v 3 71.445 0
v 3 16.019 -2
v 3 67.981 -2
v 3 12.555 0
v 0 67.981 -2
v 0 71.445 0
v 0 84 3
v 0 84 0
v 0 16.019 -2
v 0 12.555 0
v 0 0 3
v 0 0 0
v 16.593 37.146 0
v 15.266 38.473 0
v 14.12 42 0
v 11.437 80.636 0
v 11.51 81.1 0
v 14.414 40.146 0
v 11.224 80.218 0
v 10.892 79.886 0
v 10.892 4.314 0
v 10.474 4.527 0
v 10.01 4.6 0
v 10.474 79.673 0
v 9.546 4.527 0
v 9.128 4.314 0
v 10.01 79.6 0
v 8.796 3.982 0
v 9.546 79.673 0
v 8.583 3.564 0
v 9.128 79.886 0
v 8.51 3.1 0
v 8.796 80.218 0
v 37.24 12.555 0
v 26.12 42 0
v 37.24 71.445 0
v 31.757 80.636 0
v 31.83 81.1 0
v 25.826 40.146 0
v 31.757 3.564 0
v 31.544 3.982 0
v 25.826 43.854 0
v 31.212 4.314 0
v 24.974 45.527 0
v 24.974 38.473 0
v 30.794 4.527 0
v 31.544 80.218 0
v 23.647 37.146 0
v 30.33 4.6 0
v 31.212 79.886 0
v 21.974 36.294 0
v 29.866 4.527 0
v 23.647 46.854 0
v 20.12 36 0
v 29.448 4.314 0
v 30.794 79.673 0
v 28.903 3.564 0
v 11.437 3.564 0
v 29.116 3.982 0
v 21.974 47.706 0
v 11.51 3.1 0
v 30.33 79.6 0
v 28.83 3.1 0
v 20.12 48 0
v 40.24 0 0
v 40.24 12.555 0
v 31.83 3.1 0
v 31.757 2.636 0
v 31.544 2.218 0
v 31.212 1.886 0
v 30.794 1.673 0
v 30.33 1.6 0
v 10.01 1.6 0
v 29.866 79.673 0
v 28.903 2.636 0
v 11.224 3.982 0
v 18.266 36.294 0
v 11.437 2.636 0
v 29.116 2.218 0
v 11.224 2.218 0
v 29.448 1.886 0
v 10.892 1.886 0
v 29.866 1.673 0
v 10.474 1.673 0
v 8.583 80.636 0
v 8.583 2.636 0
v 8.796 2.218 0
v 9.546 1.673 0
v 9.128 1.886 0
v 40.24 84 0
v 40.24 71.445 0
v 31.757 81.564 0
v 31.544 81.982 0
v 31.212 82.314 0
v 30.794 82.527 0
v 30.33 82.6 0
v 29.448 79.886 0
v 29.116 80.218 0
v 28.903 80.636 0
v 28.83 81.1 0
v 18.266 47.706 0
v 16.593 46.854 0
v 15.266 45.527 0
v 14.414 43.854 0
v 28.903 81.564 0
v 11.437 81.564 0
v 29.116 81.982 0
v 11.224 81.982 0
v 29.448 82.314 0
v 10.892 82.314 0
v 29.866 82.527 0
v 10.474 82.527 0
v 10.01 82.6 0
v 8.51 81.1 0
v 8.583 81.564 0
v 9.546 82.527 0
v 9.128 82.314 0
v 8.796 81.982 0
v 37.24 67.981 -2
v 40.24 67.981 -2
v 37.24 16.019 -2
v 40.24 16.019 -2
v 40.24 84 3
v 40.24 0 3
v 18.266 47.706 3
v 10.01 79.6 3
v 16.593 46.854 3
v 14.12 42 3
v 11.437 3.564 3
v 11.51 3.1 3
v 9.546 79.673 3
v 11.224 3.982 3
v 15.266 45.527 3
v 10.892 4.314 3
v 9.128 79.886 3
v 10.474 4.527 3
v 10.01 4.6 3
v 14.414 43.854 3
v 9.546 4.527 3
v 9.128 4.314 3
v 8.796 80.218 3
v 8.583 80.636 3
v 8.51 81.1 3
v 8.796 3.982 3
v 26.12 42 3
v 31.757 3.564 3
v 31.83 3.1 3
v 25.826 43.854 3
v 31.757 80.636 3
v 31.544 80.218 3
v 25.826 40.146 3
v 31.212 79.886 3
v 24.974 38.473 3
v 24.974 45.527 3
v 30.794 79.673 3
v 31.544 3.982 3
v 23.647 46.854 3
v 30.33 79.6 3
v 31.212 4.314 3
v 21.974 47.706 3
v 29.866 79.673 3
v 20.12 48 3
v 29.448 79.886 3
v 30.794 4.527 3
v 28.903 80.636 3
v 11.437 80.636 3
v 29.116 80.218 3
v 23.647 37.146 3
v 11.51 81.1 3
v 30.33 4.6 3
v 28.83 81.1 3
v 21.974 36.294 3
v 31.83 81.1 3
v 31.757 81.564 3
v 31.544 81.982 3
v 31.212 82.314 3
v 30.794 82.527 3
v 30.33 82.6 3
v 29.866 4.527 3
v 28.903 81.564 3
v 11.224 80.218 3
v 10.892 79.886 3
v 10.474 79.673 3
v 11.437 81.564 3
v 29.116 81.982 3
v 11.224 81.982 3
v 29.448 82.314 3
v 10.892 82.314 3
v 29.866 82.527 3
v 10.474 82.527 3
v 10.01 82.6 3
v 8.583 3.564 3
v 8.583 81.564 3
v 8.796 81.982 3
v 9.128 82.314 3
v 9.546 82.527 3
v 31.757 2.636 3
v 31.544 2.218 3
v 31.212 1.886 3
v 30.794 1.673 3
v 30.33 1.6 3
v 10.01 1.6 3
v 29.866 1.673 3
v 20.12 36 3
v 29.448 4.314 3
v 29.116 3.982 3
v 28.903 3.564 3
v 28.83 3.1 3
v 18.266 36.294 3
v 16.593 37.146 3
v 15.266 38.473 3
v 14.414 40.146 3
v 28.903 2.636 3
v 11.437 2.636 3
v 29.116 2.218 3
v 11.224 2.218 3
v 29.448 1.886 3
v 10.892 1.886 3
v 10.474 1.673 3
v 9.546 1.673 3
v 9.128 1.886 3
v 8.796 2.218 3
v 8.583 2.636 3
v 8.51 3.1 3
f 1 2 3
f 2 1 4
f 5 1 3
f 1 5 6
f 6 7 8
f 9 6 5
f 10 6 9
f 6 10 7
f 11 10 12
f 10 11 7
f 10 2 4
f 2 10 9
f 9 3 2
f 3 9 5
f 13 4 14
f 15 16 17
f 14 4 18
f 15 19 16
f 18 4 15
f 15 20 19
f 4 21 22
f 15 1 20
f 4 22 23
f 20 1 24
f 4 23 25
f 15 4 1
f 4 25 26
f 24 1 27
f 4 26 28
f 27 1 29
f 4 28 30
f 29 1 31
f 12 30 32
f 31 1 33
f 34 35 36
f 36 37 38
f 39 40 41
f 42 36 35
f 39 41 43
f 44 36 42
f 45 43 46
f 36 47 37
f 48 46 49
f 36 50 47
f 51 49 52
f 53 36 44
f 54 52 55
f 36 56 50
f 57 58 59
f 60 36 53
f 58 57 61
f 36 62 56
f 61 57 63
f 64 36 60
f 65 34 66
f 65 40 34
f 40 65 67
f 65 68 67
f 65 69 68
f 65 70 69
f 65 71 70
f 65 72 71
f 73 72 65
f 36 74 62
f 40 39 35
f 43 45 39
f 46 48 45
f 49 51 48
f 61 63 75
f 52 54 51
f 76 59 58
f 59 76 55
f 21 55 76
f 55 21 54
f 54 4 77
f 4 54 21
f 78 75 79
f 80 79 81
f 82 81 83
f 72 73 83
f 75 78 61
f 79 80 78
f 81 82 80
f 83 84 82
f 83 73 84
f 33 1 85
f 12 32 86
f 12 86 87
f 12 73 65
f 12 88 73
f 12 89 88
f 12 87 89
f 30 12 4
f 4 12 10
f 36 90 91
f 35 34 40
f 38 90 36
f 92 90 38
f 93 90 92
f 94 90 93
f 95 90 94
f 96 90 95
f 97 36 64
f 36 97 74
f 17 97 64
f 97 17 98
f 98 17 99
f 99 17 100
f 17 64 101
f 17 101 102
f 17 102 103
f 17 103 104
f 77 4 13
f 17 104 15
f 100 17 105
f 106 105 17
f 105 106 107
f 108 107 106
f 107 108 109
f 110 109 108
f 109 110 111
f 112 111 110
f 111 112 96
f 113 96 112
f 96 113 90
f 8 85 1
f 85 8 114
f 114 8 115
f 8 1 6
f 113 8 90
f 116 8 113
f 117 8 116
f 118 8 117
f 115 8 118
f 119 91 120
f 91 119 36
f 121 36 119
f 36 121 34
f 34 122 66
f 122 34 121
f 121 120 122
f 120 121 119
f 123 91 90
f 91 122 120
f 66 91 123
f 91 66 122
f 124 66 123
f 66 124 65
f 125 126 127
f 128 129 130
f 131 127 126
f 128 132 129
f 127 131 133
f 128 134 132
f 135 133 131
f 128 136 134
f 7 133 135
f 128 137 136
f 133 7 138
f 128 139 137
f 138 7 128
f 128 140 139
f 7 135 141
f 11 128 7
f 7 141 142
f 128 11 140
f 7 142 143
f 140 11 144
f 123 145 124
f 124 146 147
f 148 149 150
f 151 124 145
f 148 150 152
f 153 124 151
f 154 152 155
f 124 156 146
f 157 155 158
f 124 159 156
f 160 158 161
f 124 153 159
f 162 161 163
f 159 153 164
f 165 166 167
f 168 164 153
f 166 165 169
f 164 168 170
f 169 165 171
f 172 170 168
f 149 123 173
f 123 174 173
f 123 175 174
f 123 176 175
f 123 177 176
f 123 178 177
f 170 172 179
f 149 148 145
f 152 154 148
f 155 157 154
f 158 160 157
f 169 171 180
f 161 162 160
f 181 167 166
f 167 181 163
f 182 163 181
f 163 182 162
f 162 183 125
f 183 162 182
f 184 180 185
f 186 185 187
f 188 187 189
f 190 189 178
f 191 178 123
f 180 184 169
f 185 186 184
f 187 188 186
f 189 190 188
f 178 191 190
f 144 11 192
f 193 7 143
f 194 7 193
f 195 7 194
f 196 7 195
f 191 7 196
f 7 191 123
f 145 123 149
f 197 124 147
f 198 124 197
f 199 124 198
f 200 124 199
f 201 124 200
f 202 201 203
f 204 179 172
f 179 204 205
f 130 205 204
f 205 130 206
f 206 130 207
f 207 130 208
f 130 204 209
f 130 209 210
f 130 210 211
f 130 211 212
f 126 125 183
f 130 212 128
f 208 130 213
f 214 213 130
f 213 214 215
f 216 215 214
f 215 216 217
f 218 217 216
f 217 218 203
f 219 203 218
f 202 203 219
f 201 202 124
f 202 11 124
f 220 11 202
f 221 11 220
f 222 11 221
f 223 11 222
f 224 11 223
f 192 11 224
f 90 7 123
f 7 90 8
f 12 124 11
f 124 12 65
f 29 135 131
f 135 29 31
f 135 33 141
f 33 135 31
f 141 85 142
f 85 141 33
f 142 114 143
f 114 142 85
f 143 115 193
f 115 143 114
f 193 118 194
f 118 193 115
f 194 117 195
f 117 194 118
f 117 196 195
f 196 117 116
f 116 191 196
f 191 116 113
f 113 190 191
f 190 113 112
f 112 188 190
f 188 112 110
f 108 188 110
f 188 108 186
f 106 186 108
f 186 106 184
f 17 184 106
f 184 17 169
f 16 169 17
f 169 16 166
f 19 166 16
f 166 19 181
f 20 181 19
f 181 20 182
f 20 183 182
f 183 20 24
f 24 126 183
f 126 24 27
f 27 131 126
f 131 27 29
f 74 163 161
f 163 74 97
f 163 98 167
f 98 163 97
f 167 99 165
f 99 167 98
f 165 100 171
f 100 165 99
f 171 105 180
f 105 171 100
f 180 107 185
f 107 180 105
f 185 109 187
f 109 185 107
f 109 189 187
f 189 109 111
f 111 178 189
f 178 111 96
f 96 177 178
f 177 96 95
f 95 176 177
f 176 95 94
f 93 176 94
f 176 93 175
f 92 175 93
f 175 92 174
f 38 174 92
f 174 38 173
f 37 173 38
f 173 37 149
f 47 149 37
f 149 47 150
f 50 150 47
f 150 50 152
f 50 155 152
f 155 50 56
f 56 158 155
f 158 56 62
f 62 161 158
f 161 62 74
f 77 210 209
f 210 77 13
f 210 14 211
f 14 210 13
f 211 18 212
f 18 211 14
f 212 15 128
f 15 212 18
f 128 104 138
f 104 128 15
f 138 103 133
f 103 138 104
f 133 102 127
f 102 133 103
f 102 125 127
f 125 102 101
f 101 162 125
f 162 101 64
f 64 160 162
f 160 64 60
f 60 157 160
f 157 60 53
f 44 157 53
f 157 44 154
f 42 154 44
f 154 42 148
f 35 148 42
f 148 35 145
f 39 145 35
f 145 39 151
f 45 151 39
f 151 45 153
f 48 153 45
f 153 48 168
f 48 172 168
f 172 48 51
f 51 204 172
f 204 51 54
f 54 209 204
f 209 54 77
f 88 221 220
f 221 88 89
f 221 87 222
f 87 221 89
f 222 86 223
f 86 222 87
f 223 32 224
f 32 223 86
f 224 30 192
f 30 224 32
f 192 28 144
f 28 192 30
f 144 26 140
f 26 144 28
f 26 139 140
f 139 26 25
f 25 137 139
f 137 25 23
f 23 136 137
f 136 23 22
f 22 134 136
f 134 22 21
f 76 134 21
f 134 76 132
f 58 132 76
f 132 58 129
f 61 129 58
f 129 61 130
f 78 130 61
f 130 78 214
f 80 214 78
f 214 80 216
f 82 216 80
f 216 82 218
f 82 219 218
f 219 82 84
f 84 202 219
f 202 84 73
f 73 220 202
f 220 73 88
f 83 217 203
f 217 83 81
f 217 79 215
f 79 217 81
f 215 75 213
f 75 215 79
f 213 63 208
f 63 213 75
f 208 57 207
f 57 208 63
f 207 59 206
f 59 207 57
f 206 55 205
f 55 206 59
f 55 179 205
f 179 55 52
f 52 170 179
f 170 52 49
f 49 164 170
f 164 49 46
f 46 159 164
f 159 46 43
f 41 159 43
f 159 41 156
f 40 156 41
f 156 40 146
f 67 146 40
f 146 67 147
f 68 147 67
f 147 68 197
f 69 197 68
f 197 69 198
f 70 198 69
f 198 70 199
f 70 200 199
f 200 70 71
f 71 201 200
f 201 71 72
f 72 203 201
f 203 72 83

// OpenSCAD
// file: panel.scad
$fn = 20;
U = 3;
T = 16;

h = U * 44.5 - 5;
w = T * 5.08 - 2*.2;

m_x = 7.47;
//m_x = 0;
m_y = 3.1;
m_d = 3;

F = U * 44.5 + (122.5 - 3 * 44.5);

echo(w);

module hole() {
//    hull() {
    //circle(d=m_d);
    translate([5.08/2,0]) circle(d=m_d);
//    }
}

module holes() {
    translate([m_x, m_y]) hole();
    translate([m_x, m_y + F]) hole();
}

module panel() {
    difference() {
    square([w, h]);
        holes();
        if(T>6) {
            translate([(T-3) * 5.08 - 5.08, 0]) holes();
        }
        translate([(T-24) * 5.08, 0]) holes();
    }
}

//panel();

//#square([46,62]);
//#import("jr-module-bay-cover.stl");
// main file
b_w = 13;
b_h = 20;

include <panel.scad>

T=8;
U = 2;

difference() {
    linear_extrude(3)
    difference() {
    panel();
    translate([w/2,h/2])
   
    intersection() {
        circle(d=12, true);
        square([20,22],true);
    }

    }

}

intersection() {
    translate([0,h/2,25])
    rotate([0,90,0])
    linear_extrude(3)
    circle(d=h, $fn=6);
    
    translate([0,0,-2])
    linear_extrude(2)
    panel(); 
}


intersection() {
    translate([w-3,h/2,25])
    rotate([0,90,0])
    linear_extrude(3)
    circle(d=h, $fn=6);
    
    translate([0,0,-2])
    linear_extrude(2)
    panel(); 
}
